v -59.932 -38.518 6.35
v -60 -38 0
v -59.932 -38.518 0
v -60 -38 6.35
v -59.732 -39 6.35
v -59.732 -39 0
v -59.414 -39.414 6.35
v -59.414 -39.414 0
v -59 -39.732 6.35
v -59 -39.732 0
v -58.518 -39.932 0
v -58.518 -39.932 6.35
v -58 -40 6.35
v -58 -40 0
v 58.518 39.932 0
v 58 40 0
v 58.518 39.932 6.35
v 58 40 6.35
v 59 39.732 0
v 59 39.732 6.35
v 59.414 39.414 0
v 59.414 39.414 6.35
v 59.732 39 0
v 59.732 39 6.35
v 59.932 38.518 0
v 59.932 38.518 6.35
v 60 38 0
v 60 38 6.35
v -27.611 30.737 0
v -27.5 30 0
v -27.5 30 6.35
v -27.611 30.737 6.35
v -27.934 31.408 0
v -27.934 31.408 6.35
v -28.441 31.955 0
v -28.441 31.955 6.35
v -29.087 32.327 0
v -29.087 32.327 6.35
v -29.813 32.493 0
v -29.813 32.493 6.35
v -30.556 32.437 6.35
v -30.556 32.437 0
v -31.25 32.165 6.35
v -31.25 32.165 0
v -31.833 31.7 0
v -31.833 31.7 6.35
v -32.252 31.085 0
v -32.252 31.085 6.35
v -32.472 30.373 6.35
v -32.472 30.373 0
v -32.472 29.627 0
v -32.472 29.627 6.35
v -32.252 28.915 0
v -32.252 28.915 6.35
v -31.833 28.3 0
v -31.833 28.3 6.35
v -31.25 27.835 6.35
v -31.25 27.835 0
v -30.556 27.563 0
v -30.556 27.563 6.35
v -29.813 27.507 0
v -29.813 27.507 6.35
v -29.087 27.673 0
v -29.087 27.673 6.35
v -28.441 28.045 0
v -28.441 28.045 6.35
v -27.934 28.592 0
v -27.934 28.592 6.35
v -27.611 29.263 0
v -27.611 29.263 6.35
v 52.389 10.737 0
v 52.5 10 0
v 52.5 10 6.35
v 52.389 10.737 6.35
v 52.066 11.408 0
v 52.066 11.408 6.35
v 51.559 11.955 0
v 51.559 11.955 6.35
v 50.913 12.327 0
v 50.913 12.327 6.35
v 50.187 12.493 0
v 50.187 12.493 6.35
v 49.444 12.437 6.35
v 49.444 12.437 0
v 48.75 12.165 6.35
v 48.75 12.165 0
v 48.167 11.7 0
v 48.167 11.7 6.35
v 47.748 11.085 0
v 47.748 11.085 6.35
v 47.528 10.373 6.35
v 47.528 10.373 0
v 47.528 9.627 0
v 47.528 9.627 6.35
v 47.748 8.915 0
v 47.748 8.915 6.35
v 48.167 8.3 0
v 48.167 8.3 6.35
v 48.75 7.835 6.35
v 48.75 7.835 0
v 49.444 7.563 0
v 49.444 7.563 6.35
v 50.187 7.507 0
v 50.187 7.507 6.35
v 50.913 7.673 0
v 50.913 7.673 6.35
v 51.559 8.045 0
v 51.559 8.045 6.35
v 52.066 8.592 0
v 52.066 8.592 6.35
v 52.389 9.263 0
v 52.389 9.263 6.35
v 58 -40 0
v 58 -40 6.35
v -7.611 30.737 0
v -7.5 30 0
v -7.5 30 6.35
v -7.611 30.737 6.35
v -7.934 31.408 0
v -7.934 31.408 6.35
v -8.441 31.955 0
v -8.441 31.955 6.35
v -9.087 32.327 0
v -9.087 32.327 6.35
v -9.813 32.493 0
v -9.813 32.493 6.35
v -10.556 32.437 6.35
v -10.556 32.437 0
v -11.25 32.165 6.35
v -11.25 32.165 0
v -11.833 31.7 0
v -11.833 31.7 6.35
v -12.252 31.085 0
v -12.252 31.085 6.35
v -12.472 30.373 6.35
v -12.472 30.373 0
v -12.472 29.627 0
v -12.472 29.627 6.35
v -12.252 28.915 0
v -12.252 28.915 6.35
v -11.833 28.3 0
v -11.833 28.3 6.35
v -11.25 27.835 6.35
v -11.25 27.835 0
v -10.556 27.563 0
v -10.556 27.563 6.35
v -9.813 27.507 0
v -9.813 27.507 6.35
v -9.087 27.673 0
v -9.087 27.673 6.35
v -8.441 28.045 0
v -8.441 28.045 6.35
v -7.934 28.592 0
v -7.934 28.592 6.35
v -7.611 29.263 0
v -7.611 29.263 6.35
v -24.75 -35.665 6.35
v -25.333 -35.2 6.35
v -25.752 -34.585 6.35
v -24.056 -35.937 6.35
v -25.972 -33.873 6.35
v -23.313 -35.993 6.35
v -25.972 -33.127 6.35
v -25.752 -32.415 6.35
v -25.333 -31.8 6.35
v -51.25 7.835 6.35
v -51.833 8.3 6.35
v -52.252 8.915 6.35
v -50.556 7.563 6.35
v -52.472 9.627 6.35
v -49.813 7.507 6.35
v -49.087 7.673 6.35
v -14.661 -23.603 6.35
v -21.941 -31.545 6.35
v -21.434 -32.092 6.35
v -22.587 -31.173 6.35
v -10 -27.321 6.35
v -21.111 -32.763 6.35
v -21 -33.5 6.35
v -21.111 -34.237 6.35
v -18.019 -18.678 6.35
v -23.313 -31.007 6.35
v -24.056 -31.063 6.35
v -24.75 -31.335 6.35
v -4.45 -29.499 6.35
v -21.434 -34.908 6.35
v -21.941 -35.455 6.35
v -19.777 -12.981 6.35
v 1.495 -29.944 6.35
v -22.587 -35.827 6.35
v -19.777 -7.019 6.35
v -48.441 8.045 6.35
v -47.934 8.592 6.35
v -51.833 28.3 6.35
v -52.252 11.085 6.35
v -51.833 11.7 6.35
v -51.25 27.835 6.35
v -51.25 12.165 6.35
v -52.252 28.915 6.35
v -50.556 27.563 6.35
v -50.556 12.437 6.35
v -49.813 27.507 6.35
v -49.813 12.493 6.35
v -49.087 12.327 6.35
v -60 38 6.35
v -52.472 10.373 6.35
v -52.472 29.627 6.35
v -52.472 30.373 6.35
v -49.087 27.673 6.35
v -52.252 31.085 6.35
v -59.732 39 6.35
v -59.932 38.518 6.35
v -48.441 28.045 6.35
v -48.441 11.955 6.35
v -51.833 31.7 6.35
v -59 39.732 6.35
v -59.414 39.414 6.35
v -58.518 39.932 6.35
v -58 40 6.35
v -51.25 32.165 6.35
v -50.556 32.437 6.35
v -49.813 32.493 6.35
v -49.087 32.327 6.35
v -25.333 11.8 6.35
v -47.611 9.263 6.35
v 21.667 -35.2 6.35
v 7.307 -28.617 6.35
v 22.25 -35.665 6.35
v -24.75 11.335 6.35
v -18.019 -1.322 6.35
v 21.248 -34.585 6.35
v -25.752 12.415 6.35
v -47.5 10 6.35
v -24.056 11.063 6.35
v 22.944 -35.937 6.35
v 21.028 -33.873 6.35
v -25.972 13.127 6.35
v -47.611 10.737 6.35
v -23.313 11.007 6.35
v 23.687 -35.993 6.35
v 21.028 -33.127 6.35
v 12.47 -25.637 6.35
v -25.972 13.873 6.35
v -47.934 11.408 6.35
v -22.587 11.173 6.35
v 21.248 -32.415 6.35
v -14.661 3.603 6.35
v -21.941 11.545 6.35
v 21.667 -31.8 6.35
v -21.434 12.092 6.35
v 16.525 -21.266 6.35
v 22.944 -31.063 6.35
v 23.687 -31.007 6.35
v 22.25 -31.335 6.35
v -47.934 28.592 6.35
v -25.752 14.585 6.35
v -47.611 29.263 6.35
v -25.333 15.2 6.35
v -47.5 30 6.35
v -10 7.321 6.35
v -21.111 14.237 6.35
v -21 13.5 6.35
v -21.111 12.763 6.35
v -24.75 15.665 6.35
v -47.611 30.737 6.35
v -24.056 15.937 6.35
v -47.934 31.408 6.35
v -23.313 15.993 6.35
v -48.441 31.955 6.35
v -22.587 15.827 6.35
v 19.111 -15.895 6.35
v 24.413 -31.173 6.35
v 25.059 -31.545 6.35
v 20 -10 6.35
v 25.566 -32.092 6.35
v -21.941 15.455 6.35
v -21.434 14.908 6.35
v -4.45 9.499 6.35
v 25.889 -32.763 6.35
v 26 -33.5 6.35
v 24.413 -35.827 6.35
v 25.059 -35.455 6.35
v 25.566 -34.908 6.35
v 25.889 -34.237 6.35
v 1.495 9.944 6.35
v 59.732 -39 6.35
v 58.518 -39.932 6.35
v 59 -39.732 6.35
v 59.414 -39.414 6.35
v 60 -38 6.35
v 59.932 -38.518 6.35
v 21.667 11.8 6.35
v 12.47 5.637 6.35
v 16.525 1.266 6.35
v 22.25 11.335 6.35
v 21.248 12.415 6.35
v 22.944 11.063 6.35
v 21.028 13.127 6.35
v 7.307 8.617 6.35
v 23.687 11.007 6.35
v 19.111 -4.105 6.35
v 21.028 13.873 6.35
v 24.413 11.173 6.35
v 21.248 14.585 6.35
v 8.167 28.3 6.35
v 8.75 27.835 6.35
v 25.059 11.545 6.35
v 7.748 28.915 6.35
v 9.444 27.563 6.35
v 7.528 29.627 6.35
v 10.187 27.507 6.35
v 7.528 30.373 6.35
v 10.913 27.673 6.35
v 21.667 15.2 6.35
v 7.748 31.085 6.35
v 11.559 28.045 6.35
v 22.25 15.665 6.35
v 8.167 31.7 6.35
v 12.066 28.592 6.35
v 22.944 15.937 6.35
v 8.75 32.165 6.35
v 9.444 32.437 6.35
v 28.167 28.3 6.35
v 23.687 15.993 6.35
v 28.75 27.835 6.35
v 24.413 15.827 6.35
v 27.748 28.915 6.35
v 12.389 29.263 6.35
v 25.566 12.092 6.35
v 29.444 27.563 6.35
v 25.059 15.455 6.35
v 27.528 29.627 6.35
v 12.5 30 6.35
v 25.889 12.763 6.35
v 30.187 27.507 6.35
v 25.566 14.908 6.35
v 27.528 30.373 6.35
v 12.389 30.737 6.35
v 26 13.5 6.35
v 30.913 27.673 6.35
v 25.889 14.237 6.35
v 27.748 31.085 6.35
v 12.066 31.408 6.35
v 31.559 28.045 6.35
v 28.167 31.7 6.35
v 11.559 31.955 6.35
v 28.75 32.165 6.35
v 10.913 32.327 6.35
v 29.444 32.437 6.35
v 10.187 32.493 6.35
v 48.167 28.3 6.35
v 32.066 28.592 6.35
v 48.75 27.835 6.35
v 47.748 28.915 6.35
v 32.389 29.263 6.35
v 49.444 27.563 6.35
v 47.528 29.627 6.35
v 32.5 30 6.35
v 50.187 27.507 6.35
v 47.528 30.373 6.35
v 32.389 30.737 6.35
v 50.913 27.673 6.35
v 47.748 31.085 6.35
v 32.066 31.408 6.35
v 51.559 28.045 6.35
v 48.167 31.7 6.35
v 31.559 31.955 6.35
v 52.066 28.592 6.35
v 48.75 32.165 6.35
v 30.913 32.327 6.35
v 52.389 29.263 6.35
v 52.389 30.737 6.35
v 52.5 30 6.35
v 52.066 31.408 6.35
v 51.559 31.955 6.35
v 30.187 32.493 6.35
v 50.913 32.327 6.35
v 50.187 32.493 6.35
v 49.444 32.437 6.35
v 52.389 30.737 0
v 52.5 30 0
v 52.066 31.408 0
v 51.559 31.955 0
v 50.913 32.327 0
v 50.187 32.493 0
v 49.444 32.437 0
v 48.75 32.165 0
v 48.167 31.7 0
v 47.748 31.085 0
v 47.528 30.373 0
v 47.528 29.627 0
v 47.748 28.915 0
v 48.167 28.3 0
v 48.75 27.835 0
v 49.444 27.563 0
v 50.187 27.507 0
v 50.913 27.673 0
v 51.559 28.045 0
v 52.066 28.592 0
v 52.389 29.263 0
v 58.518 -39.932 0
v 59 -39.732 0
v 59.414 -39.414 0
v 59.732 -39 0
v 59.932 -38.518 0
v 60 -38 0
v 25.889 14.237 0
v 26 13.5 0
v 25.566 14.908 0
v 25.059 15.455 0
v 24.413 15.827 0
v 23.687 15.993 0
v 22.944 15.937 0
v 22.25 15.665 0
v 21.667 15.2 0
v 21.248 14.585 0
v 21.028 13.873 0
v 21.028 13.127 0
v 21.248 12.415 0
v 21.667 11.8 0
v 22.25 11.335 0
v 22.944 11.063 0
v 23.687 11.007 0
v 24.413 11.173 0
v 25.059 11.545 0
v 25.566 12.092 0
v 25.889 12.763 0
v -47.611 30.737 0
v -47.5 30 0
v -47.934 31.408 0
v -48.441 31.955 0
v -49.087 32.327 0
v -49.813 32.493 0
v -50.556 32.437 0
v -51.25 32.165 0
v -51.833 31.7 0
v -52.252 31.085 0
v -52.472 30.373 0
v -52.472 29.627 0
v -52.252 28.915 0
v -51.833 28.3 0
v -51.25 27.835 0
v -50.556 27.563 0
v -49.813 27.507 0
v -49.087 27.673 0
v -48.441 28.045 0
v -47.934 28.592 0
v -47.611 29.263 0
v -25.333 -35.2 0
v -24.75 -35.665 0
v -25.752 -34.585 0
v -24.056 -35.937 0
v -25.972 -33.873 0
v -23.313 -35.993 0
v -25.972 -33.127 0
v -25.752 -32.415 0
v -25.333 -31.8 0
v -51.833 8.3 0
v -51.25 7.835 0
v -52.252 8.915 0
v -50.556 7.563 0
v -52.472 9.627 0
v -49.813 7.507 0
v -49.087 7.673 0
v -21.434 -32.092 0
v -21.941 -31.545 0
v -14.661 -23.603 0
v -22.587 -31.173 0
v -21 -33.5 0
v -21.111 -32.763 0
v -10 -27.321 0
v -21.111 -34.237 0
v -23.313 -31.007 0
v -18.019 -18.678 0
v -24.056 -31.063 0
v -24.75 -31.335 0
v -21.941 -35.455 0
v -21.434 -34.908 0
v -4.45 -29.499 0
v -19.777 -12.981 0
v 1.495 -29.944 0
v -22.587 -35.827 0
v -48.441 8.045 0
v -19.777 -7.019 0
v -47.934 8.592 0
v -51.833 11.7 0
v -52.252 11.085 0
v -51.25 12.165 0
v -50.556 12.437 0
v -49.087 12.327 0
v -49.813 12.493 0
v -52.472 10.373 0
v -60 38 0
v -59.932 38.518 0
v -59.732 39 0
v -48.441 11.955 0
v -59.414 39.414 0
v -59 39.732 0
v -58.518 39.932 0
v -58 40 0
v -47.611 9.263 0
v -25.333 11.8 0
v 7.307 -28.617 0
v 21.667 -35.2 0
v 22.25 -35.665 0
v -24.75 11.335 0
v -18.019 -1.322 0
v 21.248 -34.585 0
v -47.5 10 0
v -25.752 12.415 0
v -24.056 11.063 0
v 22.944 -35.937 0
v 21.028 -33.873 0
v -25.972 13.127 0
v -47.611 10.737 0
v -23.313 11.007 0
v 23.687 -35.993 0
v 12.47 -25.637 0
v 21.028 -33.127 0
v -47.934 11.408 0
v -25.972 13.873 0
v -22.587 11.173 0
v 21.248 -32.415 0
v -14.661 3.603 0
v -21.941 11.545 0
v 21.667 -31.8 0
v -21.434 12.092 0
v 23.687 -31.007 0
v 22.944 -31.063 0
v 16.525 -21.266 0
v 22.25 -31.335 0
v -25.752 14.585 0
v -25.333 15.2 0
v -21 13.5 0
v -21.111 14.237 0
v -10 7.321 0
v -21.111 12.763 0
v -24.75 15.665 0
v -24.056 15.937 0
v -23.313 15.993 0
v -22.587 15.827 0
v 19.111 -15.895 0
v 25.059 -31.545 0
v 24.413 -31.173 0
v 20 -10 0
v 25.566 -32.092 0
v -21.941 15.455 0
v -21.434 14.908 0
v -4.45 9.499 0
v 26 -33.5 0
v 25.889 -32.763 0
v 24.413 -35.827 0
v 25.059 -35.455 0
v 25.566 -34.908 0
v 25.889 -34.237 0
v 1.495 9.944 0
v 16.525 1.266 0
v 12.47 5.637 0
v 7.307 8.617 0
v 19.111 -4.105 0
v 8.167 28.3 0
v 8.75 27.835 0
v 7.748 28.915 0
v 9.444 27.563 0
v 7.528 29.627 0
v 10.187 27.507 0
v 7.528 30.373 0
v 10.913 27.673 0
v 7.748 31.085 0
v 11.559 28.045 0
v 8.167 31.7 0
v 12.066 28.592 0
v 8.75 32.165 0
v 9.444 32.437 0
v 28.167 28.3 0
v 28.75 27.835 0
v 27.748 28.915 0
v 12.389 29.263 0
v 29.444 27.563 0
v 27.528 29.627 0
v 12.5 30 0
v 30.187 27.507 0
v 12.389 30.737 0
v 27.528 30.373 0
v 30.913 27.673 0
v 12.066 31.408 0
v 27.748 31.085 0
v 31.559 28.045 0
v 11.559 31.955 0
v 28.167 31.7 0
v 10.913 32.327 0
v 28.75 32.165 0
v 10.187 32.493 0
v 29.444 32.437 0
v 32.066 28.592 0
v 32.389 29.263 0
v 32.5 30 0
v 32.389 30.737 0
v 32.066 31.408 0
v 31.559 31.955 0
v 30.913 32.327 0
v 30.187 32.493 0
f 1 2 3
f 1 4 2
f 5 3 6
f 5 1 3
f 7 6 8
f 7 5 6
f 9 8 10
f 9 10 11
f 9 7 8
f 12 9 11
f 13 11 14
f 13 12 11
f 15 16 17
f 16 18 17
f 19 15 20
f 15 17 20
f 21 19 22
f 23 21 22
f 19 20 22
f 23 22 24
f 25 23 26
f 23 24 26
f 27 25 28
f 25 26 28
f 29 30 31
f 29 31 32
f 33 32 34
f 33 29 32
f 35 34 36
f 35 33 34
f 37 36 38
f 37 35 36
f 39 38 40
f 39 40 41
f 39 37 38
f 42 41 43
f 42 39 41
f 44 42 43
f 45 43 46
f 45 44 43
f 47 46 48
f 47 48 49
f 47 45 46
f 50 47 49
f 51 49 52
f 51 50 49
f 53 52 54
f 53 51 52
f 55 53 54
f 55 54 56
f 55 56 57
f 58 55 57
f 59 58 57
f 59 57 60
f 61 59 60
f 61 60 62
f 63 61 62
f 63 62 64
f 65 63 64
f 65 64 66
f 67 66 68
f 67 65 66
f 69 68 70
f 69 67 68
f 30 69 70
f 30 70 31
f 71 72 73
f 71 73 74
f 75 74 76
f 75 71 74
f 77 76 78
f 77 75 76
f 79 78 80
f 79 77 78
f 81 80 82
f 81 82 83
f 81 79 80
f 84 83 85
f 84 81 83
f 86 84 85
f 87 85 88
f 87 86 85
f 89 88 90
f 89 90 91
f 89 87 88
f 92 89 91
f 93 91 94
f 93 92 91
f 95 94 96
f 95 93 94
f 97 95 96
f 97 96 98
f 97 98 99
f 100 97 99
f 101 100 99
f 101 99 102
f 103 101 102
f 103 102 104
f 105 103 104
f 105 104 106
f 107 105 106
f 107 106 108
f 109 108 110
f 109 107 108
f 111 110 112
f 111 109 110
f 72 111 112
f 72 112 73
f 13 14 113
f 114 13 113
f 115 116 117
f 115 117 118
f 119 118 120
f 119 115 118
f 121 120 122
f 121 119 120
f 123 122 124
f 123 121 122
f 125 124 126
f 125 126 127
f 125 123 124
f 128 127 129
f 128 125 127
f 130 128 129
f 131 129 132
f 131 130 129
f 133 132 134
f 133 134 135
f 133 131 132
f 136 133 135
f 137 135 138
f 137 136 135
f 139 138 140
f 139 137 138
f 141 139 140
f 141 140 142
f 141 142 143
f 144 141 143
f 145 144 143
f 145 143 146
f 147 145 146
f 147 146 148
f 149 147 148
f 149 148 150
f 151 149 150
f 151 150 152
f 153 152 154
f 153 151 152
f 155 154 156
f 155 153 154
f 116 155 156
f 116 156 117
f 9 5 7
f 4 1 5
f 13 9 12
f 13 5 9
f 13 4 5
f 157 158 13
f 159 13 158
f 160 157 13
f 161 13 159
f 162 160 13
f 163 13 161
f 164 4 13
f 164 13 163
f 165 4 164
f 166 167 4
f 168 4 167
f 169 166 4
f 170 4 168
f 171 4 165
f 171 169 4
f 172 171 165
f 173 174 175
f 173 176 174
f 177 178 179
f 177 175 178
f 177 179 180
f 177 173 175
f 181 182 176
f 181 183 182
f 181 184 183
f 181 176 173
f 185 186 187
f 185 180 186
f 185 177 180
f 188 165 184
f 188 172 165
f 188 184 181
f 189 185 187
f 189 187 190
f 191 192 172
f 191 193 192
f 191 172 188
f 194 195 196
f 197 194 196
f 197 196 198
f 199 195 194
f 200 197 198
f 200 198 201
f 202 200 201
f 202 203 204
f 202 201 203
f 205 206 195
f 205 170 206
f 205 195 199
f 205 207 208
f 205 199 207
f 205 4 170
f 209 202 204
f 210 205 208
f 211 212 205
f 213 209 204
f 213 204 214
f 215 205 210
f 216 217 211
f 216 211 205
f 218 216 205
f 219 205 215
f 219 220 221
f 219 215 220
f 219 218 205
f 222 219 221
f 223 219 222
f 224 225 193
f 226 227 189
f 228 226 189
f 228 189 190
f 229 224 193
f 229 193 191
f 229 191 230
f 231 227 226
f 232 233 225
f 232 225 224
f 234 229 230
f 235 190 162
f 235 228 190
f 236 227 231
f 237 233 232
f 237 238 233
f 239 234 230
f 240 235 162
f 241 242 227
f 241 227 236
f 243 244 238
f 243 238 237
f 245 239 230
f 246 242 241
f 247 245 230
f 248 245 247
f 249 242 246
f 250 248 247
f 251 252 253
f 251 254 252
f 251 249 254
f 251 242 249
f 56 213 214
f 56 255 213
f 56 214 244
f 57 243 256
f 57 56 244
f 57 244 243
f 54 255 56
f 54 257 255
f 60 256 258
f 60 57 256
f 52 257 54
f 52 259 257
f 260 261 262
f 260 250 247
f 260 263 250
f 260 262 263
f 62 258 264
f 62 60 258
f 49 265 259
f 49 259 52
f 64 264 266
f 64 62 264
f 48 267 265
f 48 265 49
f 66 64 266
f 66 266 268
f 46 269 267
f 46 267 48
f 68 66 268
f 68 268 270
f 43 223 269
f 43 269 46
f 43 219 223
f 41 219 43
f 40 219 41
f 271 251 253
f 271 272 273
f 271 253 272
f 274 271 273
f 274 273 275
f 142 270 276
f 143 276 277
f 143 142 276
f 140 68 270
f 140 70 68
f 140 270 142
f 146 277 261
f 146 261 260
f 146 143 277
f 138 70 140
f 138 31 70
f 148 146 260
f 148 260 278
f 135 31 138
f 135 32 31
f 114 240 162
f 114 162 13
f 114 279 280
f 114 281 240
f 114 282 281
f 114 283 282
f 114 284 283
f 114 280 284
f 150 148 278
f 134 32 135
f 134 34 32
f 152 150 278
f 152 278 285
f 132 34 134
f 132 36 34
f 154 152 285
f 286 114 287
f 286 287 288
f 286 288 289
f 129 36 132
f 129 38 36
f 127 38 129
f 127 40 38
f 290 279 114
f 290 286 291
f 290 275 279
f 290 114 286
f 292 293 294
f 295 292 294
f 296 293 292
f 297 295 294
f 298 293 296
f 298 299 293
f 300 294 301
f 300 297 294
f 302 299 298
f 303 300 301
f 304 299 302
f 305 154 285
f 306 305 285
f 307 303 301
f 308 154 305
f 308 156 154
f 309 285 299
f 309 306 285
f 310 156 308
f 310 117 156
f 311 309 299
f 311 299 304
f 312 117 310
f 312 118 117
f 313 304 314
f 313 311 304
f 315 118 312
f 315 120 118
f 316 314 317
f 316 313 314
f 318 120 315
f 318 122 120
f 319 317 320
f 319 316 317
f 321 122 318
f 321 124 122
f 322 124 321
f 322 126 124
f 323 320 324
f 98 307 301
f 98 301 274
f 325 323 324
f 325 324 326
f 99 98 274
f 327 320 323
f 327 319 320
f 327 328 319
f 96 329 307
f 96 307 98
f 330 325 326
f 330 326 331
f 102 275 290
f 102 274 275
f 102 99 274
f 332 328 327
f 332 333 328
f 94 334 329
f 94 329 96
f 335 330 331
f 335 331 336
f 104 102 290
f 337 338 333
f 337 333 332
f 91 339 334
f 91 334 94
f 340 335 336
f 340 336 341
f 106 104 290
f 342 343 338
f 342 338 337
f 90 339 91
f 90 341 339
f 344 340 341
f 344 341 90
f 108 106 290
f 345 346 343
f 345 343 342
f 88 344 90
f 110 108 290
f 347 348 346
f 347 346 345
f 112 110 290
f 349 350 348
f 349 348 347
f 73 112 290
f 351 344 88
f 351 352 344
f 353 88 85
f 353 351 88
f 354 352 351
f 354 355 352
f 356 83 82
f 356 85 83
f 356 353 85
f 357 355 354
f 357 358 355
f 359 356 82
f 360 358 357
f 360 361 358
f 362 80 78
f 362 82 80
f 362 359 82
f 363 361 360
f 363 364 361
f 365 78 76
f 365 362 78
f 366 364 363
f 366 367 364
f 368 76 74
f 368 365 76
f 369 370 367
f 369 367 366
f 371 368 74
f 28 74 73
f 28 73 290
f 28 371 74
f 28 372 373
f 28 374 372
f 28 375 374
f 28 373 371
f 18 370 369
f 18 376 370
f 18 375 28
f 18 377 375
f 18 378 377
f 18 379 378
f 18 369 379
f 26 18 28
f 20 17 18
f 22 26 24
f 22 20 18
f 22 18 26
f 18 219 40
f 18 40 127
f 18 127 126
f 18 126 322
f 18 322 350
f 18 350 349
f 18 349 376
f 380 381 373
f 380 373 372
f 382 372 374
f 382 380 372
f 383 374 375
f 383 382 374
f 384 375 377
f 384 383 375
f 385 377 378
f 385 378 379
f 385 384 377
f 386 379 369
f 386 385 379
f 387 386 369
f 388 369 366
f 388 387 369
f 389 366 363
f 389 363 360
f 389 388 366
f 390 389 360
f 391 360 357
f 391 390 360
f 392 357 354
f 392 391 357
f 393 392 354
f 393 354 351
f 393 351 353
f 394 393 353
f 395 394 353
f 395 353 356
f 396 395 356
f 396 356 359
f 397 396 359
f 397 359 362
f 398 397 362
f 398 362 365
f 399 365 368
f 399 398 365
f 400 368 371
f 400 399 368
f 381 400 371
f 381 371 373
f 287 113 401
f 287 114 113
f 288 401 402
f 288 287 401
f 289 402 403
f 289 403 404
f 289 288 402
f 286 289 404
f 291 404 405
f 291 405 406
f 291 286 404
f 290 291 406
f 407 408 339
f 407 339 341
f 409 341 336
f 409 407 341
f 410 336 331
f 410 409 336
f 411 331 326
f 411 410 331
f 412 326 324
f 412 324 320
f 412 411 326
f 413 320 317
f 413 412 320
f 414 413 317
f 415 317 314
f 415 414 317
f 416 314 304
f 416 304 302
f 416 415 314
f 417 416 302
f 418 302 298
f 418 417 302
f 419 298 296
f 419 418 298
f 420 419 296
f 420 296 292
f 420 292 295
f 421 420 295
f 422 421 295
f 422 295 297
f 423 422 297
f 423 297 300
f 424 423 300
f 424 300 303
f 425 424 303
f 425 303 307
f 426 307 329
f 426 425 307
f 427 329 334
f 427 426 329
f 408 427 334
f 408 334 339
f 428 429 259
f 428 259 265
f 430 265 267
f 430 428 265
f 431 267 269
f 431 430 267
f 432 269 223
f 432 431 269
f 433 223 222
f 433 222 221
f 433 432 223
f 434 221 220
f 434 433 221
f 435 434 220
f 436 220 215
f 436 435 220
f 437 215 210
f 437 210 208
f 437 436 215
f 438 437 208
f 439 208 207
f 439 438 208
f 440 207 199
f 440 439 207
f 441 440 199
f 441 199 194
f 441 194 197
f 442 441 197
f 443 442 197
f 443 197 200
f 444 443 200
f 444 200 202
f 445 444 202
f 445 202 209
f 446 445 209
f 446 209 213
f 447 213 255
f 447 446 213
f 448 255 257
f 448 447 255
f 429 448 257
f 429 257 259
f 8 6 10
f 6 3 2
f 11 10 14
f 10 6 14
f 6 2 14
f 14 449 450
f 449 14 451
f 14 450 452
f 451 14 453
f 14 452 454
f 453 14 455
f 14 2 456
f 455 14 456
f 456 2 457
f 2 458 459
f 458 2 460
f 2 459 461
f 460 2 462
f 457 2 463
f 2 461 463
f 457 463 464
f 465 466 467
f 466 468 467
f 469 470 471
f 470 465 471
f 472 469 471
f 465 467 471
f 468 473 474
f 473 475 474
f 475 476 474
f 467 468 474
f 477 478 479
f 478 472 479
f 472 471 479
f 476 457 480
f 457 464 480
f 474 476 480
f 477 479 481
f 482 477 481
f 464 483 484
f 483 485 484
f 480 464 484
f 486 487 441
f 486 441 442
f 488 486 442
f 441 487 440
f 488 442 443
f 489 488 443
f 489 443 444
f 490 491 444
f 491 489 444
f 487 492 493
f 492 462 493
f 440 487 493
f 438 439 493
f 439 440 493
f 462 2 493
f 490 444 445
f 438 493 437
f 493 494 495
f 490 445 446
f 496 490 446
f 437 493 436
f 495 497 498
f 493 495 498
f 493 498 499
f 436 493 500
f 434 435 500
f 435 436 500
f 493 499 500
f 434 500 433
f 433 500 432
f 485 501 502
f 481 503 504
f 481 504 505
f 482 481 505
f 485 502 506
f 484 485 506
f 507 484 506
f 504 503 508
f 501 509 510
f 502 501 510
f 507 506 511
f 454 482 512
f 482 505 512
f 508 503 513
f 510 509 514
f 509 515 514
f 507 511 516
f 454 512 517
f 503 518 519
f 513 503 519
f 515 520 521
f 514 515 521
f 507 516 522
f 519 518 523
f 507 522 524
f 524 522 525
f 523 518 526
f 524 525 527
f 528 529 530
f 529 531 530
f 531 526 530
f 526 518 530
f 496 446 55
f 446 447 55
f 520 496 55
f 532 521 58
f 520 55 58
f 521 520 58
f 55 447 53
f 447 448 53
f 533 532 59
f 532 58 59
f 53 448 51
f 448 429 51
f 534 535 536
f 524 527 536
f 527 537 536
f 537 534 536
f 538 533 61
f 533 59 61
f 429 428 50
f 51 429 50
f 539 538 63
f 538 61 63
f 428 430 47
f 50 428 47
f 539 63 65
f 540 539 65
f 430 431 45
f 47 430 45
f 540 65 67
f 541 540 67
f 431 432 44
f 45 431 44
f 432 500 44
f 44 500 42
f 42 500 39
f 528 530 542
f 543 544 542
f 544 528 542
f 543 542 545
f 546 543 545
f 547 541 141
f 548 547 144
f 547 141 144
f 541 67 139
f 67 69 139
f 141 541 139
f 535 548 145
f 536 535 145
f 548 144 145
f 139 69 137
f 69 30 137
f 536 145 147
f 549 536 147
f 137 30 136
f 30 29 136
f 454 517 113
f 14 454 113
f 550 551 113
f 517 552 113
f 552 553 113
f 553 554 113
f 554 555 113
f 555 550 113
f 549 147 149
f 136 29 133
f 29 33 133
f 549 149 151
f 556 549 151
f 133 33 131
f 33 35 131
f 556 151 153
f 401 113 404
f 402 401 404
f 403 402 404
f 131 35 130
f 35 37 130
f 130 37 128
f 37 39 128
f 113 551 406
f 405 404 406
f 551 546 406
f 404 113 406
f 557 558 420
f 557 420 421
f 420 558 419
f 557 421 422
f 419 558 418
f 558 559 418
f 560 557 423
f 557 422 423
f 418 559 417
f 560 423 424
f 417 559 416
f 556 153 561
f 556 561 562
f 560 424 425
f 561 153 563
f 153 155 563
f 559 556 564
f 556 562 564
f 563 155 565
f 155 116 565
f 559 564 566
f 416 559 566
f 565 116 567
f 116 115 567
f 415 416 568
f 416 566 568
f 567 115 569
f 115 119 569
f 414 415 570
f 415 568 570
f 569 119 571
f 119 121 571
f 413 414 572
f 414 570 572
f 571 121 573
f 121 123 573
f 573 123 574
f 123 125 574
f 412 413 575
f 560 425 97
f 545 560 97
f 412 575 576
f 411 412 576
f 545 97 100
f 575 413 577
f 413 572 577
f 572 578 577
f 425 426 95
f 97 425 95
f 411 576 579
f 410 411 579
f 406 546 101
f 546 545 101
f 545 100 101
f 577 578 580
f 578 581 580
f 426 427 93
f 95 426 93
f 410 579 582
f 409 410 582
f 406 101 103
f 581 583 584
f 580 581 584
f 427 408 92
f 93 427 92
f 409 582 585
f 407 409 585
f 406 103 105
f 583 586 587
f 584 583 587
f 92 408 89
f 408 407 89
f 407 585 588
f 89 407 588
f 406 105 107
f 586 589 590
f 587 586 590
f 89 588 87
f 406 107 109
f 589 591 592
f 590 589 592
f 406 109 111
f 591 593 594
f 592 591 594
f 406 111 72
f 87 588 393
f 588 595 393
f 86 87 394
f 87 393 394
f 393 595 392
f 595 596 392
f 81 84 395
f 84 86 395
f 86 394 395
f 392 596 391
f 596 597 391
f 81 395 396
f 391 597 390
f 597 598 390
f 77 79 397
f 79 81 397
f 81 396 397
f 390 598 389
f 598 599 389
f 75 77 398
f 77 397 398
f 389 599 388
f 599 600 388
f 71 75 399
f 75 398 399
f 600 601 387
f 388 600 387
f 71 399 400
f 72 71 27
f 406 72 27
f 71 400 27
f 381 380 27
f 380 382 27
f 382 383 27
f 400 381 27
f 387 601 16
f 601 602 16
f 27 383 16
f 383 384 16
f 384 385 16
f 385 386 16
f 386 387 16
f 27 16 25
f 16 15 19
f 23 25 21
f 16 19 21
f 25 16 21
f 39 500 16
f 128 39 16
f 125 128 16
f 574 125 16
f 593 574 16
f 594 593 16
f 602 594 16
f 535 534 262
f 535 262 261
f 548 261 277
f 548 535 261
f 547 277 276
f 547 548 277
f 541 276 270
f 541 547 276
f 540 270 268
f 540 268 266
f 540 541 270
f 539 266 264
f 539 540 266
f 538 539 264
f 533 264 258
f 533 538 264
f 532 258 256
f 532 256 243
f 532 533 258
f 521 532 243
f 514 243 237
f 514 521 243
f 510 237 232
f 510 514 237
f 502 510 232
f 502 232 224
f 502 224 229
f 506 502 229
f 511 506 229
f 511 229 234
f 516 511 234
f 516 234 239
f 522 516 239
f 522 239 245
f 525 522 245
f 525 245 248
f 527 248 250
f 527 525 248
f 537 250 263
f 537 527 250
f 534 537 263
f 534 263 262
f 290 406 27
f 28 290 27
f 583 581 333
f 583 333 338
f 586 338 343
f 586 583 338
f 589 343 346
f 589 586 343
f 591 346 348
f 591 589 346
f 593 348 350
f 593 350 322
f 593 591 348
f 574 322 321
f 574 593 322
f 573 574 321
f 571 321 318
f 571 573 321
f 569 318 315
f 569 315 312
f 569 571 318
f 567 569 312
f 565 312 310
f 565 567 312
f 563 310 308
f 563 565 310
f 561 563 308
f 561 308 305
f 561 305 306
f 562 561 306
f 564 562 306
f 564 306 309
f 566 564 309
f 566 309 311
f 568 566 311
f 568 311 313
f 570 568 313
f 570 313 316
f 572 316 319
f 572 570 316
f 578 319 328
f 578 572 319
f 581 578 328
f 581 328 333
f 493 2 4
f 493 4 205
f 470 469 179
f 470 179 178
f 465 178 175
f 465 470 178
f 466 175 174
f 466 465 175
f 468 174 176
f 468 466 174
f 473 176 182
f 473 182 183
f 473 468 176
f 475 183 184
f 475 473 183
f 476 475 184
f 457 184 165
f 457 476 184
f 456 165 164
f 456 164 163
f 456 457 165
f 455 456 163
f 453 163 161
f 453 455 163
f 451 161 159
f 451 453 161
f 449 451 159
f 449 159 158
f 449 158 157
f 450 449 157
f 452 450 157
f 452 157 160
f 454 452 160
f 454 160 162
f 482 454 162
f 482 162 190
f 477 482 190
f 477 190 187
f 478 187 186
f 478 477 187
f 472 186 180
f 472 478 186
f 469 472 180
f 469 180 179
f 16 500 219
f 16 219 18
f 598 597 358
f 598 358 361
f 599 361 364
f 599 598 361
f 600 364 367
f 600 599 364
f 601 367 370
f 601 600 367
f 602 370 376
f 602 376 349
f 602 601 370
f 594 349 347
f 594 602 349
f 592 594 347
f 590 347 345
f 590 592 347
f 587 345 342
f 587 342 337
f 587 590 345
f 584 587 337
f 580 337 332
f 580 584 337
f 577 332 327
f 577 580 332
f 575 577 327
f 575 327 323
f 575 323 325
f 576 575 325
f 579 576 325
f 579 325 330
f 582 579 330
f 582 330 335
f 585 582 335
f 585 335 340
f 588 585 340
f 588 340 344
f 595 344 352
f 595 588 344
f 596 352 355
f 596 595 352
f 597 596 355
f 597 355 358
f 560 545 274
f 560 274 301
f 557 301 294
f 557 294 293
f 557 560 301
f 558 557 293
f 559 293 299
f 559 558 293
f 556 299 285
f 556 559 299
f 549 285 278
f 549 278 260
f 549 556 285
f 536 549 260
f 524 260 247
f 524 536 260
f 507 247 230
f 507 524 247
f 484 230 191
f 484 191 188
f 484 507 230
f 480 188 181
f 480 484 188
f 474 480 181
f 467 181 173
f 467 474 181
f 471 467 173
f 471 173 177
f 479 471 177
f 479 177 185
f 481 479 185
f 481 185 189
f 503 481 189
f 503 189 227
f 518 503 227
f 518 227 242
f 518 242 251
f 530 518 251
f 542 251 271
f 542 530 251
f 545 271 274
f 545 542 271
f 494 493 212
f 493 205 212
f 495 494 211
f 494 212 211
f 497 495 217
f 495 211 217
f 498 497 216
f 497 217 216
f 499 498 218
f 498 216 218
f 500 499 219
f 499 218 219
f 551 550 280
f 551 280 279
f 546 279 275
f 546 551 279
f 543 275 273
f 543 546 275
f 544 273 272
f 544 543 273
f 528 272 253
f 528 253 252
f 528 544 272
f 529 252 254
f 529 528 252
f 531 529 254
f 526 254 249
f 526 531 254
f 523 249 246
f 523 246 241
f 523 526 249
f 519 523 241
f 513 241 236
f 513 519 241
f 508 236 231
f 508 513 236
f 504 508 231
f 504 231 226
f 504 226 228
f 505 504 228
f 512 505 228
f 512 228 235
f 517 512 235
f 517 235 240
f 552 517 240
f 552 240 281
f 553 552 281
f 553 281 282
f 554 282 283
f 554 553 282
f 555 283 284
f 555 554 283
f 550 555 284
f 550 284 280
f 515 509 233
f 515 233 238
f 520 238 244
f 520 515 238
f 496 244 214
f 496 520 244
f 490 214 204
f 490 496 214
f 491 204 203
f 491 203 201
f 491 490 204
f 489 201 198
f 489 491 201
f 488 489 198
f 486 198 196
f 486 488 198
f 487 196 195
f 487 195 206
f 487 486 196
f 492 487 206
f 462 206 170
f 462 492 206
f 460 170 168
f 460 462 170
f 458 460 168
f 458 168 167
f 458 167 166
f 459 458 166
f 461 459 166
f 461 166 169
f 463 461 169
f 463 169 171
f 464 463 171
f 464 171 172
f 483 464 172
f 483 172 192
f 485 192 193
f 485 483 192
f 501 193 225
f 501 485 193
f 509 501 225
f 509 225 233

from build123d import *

# Parameters (mm, degrees)
SKETCH1_W           = 120
SKETCH1_H           = 80
SKETCH1_R           = 2.5
SKETCH1_R_2         = 20
BOSS_EXTRUDE1_DEPTH = 6.35
FILLET1_R           = 2


with BuildPart() as part:
    # Sketch1 → Boss-Extrude1 (new body)
    with BuildSketch(Plane.XY):
        Rectangle(SKETCH1_W, SKETCH1_H)
        with Locations((-50, 30)):
            Circle(SKETCH1_R, mode=Mode.SUBTRACT)
        with Locations((-30, 30)):
            Circle(SKETCH1_R, mode=Mode.SUBTRACT)
        with Locations((-10, 30)):
            Circle(SKETCH1_R, mode=Mode.SUBTRACT)
        with Locations((10, 30)):
            Circle(SKETCH1_R, mode=Mode.SUBTRACT)
        with Locations((30, 30)):
            Circle(SKETCH1_R, mode=Mode.SUBTRACT)
        with Locations((50, 30)):
            Circle(SKETCH1_R, mode=Mode.SUBTRACT)
        with Locations((-50, 10)):
            Circle(SKETCH1_R, mode=Mode.SUBTRACT)
        with Locations((50, 10)):
            Circle(SKETCH1_R, mode=Mode.SUBTRACT)
        with Locations((0, -10)):
            Circle(SKETCH1_R_2, mode=Mode.SUBTRACT)
        with Locations((-23.5, 13.5)):
            Circle(SKETCH1_R, mode=Mode.SUBTRACT)
        with Locations((23.5, 13.5)):
            Circle(SKETCH1_R, mode=Mode.SUBTRACT)
        with Locations((23.5, -33.5)):
            Circle(SKETCH1_R, mode=Mode.SUBTRACT)
        with Locations((-23.5, -33.5)):
            Circle(SKETCH1_R, mode=Mode.SUBTRACT)
    extrude(amount=BOSS_EXTRUDE1_DEPTH)

    # Fillet1
    fillet1_edges = [part.edges().sort_by_distance(p)[0] for p in [
        (60, -40, 3.175),
        (-60, -40, 3.175),
        (-60, 40, 3.175),
        (60, 40, 3.175),
    ]]
    fillet(fillet1_edges, radius=FILLET1_R)


solid = part.part
